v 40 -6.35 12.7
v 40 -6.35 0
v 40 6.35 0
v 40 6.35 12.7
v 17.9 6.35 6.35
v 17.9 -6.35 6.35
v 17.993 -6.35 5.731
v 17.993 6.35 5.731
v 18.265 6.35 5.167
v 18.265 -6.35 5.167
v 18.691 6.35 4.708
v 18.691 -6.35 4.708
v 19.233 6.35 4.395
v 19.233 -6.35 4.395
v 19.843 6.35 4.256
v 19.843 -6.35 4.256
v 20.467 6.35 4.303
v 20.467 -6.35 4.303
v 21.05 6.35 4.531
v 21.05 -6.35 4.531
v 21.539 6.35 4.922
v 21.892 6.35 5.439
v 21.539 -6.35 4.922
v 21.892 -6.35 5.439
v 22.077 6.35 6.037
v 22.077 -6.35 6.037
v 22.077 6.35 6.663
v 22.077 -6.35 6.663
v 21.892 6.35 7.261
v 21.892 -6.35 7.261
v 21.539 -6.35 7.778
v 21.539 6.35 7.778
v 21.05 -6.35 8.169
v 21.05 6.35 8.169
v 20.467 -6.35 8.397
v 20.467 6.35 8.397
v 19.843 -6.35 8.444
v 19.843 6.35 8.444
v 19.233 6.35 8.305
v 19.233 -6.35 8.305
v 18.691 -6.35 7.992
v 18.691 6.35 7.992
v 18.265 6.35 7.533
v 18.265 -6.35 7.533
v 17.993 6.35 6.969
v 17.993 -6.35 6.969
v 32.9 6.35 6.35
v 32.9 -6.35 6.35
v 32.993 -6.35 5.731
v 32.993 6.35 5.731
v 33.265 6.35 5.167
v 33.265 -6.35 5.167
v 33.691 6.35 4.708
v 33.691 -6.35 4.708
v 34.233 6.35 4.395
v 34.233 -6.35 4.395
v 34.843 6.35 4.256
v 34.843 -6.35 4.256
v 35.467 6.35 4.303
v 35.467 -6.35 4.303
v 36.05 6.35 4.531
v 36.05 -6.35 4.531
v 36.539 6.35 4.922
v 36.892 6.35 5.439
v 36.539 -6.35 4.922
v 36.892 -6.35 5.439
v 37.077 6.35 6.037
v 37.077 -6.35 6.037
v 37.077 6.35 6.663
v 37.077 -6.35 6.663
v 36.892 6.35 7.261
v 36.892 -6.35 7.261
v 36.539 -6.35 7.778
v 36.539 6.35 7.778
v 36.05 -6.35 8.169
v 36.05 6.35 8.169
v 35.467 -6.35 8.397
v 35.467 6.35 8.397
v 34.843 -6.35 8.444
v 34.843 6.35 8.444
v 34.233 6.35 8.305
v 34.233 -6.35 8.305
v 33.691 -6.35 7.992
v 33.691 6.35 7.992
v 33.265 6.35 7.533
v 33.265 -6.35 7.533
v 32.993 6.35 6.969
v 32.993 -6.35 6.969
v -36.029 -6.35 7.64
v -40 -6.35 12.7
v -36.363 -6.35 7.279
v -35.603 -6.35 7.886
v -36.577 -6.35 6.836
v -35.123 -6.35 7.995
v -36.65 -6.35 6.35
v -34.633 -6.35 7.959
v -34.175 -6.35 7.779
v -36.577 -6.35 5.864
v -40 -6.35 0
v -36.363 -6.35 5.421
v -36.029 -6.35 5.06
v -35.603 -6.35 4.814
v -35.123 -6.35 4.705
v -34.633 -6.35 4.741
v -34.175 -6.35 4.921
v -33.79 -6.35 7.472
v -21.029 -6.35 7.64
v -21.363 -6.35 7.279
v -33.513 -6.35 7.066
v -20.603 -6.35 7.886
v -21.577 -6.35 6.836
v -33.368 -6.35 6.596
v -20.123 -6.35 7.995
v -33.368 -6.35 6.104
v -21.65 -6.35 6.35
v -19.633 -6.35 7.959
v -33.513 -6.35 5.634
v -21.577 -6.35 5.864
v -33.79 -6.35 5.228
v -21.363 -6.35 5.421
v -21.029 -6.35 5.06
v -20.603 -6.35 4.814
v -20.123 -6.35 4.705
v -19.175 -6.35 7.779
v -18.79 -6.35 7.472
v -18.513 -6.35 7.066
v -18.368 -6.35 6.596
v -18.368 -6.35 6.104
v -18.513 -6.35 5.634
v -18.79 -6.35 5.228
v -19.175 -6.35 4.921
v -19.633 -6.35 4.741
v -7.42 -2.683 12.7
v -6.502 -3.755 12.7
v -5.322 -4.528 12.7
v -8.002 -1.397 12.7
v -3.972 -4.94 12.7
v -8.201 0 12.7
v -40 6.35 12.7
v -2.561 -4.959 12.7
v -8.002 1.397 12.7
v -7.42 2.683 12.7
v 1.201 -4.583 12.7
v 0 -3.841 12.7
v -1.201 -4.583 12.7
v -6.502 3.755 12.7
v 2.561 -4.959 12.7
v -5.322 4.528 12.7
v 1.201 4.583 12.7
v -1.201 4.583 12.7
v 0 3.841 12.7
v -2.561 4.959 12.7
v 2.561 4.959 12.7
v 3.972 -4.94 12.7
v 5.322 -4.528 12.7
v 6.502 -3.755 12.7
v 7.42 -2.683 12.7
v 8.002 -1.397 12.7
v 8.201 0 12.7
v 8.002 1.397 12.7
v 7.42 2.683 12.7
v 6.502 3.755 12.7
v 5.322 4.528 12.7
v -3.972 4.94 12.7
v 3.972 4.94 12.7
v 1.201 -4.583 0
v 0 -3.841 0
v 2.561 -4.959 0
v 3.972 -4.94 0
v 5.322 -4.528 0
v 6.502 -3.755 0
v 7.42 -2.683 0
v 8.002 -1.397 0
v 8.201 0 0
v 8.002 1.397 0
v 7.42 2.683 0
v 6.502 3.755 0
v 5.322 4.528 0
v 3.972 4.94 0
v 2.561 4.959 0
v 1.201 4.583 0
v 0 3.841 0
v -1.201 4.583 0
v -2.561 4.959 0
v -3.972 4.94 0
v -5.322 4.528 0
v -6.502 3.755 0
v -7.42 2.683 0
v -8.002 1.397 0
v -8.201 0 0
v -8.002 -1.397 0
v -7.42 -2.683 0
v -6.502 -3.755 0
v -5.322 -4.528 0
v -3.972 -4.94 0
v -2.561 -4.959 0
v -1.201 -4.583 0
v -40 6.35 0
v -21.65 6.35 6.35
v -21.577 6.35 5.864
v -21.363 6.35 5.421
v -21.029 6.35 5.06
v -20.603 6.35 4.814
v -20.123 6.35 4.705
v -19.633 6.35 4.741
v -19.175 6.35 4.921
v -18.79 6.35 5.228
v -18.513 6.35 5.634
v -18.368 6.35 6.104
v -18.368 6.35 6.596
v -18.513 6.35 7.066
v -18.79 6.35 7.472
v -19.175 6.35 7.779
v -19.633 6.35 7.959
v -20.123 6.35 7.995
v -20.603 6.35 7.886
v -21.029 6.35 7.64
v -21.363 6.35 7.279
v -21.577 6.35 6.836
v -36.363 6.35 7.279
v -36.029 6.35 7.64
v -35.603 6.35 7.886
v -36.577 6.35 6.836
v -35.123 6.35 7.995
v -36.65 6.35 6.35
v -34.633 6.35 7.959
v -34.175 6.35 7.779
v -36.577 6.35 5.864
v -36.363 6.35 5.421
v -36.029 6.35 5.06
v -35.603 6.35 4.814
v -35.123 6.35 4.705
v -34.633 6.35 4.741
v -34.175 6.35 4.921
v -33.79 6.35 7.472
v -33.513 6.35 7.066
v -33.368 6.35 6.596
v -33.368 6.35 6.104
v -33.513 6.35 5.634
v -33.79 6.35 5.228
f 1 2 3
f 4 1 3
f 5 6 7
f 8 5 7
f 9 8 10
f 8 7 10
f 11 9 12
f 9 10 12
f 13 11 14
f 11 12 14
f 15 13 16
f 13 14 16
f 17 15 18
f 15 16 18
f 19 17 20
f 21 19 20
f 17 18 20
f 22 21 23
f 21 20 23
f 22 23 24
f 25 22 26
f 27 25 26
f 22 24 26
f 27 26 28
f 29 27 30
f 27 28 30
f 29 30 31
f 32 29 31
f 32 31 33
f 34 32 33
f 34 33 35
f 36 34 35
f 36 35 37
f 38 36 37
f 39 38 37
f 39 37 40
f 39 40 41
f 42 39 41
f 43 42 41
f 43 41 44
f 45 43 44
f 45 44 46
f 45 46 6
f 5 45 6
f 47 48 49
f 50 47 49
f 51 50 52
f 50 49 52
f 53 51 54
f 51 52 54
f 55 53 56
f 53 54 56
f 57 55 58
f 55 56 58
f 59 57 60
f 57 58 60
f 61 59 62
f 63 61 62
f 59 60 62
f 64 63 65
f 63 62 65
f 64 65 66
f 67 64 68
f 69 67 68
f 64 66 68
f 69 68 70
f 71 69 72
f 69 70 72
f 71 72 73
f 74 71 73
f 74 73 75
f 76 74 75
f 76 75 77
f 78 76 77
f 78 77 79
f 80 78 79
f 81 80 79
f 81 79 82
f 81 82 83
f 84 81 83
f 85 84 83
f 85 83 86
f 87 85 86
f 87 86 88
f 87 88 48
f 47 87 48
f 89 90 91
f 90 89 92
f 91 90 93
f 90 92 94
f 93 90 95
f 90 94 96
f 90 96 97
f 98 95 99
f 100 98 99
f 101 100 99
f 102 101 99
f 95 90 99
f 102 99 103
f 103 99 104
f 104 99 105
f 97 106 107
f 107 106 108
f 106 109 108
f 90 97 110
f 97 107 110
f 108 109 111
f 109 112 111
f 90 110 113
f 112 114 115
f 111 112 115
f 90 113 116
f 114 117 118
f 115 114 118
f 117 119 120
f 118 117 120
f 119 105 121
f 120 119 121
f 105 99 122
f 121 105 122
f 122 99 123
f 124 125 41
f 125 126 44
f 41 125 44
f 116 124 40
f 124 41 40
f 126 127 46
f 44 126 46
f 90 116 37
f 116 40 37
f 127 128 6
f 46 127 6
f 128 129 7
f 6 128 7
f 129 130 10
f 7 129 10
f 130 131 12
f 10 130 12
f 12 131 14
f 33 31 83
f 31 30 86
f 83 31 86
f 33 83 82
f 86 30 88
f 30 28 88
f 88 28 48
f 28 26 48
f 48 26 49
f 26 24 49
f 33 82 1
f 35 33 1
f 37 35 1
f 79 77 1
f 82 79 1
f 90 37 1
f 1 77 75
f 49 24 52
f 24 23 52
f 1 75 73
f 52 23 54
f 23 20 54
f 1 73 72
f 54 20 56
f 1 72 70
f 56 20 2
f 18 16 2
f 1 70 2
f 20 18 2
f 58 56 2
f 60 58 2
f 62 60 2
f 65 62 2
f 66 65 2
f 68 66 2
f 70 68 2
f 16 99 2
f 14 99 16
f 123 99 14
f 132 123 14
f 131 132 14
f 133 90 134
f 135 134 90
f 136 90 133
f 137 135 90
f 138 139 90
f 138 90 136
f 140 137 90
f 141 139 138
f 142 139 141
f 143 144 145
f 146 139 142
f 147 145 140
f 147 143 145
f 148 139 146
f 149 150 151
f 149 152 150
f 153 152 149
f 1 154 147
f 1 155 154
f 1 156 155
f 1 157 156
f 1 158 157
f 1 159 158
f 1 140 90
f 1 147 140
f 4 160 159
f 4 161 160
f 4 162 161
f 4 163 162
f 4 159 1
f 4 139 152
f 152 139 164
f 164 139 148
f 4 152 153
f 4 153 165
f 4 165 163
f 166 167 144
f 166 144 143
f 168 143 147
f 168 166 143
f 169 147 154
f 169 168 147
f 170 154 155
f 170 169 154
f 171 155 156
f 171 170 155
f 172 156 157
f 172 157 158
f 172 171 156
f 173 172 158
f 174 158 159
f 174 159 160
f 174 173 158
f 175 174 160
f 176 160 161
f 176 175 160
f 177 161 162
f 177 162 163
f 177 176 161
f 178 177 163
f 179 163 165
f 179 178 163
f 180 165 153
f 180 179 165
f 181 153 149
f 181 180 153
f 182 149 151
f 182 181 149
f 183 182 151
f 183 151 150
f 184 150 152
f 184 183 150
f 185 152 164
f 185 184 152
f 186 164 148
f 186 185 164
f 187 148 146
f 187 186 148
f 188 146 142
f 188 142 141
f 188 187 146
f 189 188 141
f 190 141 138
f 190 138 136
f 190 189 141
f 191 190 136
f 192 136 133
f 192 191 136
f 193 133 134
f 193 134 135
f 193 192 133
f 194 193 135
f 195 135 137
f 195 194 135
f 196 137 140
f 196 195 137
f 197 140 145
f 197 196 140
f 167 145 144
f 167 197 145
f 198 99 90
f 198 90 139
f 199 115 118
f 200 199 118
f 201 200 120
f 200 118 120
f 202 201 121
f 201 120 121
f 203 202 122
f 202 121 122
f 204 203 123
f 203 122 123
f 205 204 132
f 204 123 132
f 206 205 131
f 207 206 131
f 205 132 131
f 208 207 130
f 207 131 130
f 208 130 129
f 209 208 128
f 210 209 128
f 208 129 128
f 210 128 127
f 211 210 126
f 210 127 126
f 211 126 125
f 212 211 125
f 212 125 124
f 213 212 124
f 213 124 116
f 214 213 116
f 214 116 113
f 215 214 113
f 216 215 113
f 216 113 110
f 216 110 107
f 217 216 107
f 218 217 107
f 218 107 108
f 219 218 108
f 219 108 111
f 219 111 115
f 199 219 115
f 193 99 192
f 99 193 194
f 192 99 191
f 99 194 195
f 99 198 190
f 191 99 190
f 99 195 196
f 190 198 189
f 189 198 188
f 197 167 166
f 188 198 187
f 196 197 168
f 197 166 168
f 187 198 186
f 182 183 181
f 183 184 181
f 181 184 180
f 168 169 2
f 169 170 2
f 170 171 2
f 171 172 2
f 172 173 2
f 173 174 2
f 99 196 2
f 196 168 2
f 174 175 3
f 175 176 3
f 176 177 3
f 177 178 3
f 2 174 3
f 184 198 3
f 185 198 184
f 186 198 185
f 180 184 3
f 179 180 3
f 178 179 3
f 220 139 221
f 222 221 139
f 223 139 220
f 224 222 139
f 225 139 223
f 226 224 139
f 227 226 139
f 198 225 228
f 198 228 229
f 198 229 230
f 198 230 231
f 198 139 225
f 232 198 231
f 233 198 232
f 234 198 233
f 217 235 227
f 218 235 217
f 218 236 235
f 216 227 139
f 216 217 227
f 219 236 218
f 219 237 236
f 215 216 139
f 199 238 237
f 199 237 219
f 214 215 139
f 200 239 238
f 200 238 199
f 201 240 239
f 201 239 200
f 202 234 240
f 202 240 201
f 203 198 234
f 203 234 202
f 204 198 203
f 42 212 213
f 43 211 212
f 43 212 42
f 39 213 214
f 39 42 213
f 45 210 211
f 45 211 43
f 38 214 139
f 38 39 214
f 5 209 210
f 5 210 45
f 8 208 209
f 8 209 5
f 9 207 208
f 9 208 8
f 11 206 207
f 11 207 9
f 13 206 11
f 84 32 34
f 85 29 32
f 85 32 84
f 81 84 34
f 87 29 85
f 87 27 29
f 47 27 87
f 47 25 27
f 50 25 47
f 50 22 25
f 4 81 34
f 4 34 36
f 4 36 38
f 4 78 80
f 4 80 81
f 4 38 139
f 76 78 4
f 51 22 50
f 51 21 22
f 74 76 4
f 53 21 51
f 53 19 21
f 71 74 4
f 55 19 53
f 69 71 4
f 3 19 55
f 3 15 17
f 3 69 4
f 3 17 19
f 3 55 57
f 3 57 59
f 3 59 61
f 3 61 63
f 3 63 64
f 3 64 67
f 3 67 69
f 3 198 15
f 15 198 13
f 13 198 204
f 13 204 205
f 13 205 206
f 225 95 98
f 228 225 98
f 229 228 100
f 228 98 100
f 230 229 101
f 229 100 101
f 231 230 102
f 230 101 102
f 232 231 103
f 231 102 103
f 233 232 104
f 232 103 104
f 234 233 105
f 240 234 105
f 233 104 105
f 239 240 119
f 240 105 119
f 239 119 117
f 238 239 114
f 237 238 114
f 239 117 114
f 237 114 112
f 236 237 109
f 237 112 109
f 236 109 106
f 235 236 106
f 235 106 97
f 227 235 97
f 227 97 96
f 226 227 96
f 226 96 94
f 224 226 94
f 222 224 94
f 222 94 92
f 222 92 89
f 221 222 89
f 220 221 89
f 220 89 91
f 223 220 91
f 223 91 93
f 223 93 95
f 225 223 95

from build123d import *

# Parameters (mm, degrees)
CROQUIS1_W                                 = 80
CROQUIS1_H                                 = 12.7
SALIENTE_EXTRUIR1_DEPTH                    = 12.7
PERFORADOR_PARA_ROSCAR_PARA_MACHO_DE_ROS_D = 3.3
PERFORADOR_PARA_ROSCAR_PARA_MACHO_DE_2_D   = 4.2


with BuildPart() as part:
    # Croquis1 → Saliente-Extruir1 (new body)
    with BuildSketch(Plane.XY):
        Rectangle(CROQUIS1_W, CROQUIS1_H)
        with BuildLine():
            ThreePointArc((0, 3.841213022), (-8.200794046, 0), (0, -3.841213022))
            ThreePointArc((0, -3.841213022), (8.200794046, 0), (0, 3.841213022))
        make_face(mode=Mode.SUBTRACT)
    extrude(amount=SALIENTE_EXTRUIR1_DEPTH)

    # Perforador para roscar para macho de ros (through all)
    with Locations(Plane(origin=(0, 6.35, 0), x_dir=(1, 0, 0), z_dir=(0, 1, 0))):
        with Locations((-35, -6.35), (-20, -6.35)):
            Hole(PERFORADOR_PARA_ROSCAR_PARA_MACHO_DE_ROS_D / 2)

    # Perforador para roscar para macho de 2 (through all)
    with Locations(Plane(origin=(0, 6.35, 0), x_dir=(1, 0, 0), z_dir=(0, 1, 0))):
        with Locations((35, -6.35), (20, -6.35)):
            Hole(PERFORADOR_PARA_ROSCAR_PARA_MACHO_DE_2_D / 2)


solid = part.part
